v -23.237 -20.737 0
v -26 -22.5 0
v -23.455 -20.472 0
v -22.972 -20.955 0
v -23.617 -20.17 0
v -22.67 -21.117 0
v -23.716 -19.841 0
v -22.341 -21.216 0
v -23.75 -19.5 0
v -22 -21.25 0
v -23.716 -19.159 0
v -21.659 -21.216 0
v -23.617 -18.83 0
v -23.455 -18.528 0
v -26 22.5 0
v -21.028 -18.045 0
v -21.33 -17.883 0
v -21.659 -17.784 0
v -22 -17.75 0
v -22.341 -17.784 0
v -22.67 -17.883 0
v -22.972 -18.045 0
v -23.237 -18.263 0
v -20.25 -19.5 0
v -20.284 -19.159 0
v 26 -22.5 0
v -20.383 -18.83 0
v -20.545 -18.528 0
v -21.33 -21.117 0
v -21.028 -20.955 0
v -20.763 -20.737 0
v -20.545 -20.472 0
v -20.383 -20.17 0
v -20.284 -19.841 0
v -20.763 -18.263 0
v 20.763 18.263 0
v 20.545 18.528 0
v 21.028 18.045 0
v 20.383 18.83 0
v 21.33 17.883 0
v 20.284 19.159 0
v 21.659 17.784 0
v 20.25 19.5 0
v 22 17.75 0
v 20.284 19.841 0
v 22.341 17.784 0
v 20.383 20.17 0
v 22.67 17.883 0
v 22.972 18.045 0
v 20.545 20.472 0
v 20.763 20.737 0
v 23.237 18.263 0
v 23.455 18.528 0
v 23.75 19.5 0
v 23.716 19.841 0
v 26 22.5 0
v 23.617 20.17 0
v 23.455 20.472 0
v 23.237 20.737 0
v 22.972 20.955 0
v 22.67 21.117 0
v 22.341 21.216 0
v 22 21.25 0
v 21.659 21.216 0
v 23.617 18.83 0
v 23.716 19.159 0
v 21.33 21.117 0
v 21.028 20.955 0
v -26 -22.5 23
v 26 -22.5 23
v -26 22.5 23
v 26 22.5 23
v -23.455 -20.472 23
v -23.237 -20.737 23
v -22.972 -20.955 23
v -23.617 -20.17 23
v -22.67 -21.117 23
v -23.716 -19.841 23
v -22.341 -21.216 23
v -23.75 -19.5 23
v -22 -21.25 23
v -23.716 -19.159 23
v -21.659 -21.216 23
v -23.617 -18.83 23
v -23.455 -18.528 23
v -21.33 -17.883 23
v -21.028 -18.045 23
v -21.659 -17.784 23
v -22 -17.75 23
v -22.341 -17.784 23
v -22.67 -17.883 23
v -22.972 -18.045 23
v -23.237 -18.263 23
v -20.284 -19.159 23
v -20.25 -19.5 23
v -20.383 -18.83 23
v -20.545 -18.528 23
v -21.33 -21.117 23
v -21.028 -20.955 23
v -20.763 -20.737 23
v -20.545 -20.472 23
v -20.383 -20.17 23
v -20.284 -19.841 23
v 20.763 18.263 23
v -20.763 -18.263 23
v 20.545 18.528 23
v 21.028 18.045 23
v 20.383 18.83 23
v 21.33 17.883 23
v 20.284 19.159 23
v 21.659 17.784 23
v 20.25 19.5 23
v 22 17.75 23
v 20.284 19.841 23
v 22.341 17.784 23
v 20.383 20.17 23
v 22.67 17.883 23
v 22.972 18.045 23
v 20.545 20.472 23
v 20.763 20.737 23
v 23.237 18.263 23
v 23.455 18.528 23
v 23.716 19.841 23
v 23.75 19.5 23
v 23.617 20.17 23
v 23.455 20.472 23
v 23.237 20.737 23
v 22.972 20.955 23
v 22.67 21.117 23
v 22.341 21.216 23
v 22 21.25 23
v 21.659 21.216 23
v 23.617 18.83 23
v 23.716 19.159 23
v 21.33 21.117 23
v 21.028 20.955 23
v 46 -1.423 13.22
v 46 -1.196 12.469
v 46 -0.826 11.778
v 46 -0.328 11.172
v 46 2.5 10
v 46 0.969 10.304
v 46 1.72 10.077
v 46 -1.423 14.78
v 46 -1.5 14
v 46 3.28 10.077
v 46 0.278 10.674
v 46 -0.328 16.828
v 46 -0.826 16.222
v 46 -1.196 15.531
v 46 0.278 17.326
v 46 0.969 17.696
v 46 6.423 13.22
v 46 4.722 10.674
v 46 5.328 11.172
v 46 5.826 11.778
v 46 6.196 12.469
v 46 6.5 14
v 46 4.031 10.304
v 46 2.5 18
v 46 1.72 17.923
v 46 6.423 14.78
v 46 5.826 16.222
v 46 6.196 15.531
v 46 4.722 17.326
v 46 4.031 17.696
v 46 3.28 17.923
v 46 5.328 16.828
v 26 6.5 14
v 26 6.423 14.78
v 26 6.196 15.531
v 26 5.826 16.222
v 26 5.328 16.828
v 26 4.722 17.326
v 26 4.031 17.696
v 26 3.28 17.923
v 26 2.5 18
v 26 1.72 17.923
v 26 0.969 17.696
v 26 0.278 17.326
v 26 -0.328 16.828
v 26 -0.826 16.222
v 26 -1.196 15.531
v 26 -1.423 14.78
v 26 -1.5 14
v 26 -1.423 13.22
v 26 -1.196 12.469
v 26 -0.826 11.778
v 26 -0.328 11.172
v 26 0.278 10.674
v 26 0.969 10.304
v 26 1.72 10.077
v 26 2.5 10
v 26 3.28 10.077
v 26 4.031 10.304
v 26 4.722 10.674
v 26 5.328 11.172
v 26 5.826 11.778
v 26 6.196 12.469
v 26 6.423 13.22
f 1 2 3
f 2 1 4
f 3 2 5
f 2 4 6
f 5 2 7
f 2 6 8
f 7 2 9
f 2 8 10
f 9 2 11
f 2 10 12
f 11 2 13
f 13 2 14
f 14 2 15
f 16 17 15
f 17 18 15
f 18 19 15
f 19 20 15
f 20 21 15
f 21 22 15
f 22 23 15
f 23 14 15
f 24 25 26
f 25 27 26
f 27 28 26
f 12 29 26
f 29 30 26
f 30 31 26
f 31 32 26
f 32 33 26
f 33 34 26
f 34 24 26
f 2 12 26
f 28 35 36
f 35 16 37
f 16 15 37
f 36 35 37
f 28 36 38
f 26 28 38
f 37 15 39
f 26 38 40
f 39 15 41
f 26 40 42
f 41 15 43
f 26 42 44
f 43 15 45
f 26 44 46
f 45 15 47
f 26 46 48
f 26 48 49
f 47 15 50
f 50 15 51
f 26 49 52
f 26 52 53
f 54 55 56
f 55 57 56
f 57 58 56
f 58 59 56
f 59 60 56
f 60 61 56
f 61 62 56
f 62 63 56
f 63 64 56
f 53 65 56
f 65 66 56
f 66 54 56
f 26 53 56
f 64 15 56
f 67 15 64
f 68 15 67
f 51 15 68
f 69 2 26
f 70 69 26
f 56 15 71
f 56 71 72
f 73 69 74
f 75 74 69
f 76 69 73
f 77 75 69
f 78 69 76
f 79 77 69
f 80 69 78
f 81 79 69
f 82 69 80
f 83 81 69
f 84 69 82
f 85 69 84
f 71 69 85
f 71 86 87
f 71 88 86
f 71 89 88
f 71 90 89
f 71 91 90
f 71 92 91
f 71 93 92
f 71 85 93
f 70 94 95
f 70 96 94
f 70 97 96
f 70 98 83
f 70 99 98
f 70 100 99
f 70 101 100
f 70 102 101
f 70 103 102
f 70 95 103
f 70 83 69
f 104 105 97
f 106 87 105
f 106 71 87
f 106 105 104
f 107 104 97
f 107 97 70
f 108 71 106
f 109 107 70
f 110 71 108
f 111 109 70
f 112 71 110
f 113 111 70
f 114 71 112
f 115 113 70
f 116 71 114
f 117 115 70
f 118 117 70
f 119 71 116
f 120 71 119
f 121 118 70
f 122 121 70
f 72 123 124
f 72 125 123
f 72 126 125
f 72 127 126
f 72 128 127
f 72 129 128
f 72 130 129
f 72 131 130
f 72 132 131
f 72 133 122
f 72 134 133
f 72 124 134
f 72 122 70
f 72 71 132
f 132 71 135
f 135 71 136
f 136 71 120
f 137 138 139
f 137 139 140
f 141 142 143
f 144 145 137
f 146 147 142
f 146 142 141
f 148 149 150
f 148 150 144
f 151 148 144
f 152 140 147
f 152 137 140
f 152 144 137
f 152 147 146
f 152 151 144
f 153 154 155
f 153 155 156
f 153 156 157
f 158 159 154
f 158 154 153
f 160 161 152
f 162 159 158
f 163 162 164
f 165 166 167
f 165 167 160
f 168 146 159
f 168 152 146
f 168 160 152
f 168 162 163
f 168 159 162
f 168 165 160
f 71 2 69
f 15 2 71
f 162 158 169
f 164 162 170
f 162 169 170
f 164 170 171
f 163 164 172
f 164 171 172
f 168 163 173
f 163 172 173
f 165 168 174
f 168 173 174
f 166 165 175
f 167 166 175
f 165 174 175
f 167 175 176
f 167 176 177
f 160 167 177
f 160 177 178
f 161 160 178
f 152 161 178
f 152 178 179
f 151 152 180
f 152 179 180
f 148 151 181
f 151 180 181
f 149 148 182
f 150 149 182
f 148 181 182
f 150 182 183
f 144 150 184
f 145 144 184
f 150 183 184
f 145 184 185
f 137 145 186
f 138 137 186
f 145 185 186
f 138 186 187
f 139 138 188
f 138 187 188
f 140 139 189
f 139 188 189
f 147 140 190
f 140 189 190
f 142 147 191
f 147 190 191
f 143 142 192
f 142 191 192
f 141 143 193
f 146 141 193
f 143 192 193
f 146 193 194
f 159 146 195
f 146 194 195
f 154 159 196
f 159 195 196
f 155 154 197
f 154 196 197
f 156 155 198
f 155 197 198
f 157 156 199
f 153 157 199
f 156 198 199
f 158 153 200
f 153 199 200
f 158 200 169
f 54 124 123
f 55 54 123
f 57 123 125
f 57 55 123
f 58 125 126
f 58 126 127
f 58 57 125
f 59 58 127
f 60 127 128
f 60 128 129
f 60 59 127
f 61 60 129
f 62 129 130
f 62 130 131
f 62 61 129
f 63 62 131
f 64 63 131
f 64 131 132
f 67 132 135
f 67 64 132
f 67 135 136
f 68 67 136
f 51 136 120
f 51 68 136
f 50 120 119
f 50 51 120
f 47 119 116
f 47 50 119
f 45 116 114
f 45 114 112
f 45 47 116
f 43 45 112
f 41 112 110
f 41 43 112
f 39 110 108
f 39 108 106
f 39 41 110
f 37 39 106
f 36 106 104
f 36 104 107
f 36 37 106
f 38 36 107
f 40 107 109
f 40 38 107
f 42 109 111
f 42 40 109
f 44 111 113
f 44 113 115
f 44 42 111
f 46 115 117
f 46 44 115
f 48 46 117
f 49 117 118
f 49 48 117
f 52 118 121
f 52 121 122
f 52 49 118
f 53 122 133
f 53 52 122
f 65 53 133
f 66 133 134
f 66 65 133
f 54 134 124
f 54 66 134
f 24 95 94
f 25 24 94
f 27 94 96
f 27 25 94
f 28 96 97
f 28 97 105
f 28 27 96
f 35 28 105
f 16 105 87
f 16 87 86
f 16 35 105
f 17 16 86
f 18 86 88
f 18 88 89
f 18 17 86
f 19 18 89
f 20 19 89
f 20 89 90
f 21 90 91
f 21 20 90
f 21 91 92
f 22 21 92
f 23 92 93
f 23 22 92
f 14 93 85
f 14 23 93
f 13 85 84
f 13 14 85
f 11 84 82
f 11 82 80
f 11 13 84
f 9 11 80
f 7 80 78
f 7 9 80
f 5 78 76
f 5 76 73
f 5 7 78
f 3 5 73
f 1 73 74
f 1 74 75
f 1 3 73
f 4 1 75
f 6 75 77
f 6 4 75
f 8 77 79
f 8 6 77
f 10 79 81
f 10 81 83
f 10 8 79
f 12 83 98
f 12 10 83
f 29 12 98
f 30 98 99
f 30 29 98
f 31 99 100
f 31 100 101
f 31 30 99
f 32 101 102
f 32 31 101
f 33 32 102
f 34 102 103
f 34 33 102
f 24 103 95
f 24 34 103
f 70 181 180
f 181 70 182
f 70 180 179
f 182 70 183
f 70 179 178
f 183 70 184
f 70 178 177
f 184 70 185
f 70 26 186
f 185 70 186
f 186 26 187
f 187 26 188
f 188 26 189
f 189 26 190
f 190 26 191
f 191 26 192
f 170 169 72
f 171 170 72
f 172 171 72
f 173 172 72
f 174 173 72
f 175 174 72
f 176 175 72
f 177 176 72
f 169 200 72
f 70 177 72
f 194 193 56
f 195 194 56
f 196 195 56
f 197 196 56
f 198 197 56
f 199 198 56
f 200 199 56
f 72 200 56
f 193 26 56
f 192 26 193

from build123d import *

# Parameters (mm, degrees)
SKETCH_W     = 52
SKETCH_H     = 45
SKETCH_R     = 1.75
PAD_DEPTH    = 23
SKETCH001_R  = 4
PAD001_DEPTH = 20


with BuildPart() as part:
    # Sketch → Pad (new body)
    with BuildSketch(Plane.XY):
        Rectangle(SKETCH_W, SKETCH_H)
        with Locations((-22, -19.5)):
            Circle(SKETCH_R, mode=Mode.SUBTRACT)
        with Locations((22, 19.5)):
            Circle(SKETCH_R, mode=Mode.SUBTRACT)
    extrude(amount=PAD_DEPTH)

    # Sketch001 (on Face2 of Pad) → Pad001 (join)
    with BuildSketch(Plane.YZ.offset(26)):
        with Locations((2.5, 14)):
            Circle(SKETCH001_R)
    extrude(amount=PAD001_DEPTH)


solid = part.part
